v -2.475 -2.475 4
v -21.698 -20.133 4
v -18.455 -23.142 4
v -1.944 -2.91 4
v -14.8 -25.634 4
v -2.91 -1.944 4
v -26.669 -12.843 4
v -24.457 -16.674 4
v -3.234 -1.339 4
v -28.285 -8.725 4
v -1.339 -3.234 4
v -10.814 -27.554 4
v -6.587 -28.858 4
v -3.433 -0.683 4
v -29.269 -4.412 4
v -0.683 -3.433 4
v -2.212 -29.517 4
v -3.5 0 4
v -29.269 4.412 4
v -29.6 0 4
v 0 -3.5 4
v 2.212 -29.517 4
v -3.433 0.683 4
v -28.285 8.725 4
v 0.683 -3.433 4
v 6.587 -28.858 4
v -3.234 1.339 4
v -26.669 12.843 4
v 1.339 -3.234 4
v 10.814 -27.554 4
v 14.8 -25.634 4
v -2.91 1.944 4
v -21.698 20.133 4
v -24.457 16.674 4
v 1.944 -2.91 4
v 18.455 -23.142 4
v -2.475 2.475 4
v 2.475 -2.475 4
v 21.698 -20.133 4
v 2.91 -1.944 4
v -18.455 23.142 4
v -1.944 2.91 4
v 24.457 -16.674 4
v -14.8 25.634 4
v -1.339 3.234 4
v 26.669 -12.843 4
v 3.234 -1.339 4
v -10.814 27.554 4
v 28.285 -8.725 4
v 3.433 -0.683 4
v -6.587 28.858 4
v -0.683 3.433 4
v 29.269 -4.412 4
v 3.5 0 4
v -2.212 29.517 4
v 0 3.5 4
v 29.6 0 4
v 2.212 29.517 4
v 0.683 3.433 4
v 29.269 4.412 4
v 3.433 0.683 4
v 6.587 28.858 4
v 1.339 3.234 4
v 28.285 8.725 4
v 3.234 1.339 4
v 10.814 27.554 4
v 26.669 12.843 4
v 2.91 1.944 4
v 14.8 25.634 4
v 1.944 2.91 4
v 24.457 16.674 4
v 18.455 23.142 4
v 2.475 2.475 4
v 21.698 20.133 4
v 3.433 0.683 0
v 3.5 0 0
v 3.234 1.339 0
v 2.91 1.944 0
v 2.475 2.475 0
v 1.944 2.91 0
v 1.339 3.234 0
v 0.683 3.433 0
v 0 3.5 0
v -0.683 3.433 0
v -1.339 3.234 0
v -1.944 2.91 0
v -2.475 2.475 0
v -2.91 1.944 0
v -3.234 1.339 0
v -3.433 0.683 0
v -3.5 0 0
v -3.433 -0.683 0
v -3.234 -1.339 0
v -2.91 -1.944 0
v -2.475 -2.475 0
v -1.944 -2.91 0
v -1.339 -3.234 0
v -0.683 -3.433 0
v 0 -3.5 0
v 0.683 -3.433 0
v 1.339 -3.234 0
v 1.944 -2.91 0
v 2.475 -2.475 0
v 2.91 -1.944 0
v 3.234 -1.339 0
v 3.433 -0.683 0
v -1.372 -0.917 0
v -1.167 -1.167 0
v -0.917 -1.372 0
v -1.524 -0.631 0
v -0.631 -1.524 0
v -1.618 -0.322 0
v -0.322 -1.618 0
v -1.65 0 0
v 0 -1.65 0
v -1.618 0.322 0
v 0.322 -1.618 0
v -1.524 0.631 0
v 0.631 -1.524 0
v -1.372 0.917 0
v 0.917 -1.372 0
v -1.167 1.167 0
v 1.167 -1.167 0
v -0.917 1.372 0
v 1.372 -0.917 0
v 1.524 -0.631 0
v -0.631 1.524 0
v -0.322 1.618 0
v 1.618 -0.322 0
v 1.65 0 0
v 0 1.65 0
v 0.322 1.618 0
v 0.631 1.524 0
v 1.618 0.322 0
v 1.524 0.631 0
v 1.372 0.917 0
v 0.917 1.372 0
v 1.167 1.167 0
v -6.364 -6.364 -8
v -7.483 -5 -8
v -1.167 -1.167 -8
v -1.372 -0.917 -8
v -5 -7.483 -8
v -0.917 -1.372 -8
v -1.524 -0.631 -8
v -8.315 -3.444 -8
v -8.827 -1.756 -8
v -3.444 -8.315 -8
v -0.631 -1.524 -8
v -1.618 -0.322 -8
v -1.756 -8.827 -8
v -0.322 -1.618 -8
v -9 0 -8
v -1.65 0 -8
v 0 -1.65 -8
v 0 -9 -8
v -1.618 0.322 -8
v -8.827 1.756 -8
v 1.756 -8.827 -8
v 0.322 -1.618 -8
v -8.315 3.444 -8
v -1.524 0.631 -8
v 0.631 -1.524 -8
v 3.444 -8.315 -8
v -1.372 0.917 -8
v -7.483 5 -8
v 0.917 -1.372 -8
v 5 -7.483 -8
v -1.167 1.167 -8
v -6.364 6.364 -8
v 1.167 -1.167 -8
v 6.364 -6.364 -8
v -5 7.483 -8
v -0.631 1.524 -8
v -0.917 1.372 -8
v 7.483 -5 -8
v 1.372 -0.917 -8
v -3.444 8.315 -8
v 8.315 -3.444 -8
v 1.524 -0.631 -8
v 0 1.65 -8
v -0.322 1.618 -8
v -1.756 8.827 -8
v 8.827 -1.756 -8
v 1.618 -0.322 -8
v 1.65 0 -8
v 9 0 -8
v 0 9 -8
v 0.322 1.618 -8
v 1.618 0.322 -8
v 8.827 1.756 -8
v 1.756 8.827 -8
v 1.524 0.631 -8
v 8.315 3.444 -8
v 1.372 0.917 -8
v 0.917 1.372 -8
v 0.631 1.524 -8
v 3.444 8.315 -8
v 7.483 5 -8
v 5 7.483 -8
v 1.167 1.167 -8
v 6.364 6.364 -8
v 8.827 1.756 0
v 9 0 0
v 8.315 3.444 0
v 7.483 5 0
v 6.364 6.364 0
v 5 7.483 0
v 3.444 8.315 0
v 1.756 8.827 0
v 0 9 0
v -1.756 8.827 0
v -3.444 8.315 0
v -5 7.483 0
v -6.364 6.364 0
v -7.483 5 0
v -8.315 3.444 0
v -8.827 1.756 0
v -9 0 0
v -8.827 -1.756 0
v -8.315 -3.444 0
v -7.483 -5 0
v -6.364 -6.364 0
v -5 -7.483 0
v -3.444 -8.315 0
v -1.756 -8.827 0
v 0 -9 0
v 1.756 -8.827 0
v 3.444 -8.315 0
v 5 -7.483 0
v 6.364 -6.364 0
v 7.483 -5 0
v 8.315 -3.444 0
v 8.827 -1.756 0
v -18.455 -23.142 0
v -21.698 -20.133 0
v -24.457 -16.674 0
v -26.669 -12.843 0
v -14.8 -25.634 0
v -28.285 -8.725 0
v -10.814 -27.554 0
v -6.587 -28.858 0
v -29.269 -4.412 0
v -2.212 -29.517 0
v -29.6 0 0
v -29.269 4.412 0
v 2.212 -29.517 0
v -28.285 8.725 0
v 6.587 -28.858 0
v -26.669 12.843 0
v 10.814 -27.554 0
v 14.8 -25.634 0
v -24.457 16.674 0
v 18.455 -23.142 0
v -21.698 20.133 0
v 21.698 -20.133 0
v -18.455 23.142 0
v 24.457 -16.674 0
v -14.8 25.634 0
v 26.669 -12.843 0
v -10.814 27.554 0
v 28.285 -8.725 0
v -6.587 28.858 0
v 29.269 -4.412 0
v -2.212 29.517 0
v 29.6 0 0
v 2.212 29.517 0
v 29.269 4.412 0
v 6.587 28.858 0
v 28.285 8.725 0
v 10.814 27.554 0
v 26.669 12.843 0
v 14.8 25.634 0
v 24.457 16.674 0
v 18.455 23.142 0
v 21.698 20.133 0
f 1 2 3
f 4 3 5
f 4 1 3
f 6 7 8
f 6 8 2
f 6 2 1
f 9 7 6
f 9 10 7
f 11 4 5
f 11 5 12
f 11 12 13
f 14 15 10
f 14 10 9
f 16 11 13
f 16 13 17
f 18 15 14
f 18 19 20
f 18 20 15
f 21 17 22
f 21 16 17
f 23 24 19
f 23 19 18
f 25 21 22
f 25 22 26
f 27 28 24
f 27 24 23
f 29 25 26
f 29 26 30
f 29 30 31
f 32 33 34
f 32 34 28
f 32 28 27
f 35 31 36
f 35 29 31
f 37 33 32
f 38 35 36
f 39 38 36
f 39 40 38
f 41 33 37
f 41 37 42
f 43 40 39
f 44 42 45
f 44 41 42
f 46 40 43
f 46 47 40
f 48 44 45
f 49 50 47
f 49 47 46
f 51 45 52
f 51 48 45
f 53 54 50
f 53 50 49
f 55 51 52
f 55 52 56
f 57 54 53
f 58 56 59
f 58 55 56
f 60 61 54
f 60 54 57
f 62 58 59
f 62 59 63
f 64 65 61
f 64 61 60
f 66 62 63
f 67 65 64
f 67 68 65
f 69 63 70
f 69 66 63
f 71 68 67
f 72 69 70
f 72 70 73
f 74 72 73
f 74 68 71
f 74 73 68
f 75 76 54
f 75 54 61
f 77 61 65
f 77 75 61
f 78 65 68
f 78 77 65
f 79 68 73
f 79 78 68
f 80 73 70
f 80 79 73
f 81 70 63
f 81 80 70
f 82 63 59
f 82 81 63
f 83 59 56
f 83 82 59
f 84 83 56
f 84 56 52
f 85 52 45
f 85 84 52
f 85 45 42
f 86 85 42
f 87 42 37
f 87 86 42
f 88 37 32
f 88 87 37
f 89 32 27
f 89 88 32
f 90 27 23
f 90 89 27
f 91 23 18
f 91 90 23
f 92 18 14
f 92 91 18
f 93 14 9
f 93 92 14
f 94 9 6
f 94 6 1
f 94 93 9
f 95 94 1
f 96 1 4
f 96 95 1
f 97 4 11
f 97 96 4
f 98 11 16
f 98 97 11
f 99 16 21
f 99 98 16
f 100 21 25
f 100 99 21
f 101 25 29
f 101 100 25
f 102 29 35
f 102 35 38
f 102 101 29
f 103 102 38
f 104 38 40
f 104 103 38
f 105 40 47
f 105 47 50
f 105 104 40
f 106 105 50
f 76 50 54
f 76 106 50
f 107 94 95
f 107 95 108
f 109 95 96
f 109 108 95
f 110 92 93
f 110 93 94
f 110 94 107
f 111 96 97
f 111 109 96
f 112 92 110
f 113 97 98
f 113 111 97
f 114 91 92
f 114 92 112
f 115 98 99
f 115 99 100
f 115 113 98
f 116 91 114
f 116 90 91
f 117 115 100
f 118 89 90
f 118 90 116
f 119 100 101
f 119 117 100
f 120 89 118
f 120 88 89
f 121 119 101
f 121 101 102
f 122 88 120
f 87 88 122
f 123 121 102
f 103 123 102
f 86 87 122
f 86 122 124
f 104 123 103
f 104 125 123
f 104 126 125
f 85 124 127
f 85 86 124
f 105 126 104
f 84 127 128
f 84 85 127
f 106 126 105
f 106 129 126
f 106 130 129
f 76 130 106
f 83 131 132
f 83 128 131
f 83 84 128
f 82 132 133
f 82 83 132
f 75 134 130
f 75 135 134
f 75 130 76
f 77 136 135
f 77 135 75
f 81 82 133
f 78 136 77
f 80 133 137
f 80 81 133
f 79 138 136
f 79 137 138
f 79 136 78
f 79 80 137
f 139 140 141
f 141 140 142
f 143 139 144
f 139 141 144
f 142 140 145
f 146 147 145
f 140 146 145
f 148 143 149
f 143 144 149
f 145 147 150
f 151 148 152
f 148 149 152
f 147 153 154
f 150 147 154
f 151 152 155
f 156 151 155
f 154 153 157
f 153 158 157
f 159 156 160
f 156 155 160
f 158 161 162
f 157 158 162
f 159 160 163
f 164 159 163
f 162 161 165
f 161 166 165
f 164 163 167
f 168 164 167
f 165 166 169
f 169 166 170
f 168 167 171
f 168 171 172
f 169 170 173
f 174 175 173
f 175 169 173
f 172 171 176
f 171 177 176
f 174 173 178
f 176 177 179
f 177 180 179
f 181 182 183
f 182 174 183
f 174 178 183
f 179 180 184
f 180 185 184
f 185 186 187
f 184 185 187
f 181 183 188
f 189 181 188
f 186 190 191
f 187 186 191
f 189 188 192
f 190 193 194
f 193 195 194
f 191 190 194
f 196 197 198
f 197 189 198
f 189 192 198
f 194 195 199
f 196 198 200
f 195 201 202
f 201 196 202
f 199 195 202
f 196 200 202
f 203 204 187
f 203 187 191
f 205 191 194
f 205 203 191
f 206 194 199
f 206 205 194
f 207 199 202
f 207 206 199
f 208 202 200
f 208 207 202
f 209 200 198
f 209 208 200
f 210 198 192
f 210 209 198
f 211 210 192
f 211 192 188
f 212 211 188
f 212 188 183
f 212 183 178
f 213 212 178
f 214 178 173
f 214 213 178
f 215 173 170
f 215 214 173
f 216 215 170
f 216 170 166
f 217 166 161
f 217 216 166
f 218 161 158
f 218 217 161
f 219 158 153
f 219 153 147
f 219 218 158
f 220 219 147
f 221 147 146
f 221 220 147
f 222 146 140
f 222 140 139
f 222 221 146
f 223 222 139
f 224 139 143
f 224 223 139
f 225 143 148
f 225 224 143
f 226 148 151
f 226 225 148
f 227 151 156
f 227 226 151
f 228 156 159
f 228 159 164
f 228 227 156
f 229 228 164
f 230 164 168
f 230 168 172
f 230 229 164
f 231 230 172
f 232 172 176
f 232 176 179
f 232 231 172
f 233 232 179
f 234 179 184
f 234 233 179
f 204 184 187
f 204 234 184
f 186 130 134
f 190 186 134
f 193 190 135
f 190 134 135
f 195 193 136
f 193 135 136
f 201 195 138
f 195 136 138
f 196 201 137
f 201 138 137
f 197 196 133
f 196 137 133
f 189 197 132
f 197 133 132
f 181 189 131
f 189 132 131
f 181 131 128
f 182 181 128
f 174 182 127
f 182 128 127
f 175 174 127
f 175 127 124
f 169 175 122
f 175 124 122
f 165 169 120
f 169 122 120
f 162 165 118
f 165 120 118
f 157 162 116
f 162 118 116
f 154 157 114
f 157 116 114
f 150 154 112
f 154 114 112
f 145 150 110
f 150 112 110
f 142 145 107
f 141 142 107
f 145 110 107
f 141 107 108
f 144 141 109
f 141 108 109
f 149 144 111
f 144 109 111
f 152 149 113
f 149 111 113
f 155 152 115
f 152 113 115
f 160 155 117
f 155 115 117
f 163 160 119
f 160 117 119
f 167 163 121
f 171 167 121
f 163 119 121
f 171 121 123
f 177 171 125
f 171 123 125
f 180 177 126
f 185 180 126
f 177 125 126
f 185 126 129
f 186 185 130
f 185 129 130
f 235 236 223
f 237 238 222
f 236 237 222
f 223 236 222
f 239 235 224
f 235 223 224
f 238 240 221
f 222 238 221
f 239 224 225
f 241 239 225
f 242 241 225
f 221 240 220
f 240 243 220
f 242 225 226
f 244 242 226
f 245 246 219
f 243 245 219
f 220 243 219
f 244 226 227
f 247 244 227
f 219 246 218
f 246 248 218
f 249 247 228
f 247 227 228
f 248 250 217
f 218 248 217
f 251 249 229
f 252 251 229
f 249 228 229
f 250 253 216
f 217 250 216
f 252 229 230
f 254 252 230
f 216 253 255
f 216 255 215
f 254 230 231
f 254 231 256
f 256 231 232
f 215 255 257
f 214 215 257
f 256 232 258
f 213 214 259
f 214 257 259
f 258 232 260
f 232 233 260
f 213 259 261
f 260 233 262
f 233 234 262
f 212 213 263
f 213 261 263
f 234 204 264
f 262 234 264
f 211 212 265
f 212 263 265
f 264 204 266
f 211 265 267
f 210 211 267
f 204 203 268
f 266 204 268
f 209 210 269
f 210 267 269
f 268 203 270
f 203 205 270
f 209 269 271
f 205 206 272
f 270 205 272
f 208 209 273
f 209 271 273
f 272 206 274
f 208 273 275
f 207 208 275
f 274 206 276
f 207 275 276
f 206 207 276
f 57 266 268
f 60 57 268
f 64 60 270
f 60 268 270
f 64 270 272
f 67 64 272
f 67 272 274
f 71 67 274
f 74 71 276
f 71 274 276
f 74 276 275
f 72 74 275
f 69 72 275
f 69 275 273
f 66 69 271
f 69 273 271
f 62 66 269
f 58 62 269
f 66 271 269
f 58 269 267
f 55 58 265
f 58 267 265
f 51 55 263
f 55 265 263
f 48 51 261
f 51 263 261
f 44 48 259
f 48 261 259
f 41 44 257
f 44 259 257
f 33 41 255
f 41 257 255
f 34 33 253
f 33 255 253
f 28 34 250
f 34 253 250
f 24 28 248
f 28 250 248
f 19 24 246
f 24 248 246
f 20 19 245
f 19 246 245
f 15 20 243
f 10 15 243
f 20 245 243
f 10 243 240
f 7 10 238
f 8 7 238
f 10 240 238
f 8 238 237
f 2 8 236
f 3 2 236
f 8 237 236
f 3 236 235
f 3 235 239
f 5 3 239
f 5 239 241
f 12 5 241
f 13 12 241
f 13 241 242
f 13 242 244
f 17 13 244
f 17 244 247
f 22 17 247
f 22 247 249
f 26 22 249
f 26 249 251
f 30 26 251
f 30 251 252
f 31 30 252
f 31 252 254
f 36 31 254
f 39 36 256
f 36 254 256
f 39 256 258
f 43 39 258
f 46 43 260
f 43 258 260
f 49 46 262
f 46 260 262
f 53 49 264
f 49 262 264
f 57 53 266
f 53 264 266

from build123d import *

# Parameters (mm, degrees)
F0_R     = 29.6
F0_R_2   = 9
F0_R_3   = 3.5
F1_DEPTH = 4
F0_R_4   = 1.65
F2_DEPTH = 8


with BuildPart() as f1:
    # F0 (on Top) → F1 (new body)
    with BuildSketch(Plane.XY):
        Circle(F0_R)
        Circle(F0_R_2, mode=Mode.SUBTRACT)
        Circle(F0_R_2)
        Circle(F0_R_3, mode=Mode.SUBTRACT)
    extrude(amount=F1_DEPTH)

    # F0 (on Top) → F2 (join)
    with BuildSketch(Plane.XY):
        Circle(F0_R_2)
        Circle(F0_R_3, mode=Mode.SUBTRACT)
        Circle(F0_R_3)
        Circle(F0_R_4, mode=Mode.SUBTRACT)
    extrude(amount=-F2_DEPTH)


solid = f1.part
